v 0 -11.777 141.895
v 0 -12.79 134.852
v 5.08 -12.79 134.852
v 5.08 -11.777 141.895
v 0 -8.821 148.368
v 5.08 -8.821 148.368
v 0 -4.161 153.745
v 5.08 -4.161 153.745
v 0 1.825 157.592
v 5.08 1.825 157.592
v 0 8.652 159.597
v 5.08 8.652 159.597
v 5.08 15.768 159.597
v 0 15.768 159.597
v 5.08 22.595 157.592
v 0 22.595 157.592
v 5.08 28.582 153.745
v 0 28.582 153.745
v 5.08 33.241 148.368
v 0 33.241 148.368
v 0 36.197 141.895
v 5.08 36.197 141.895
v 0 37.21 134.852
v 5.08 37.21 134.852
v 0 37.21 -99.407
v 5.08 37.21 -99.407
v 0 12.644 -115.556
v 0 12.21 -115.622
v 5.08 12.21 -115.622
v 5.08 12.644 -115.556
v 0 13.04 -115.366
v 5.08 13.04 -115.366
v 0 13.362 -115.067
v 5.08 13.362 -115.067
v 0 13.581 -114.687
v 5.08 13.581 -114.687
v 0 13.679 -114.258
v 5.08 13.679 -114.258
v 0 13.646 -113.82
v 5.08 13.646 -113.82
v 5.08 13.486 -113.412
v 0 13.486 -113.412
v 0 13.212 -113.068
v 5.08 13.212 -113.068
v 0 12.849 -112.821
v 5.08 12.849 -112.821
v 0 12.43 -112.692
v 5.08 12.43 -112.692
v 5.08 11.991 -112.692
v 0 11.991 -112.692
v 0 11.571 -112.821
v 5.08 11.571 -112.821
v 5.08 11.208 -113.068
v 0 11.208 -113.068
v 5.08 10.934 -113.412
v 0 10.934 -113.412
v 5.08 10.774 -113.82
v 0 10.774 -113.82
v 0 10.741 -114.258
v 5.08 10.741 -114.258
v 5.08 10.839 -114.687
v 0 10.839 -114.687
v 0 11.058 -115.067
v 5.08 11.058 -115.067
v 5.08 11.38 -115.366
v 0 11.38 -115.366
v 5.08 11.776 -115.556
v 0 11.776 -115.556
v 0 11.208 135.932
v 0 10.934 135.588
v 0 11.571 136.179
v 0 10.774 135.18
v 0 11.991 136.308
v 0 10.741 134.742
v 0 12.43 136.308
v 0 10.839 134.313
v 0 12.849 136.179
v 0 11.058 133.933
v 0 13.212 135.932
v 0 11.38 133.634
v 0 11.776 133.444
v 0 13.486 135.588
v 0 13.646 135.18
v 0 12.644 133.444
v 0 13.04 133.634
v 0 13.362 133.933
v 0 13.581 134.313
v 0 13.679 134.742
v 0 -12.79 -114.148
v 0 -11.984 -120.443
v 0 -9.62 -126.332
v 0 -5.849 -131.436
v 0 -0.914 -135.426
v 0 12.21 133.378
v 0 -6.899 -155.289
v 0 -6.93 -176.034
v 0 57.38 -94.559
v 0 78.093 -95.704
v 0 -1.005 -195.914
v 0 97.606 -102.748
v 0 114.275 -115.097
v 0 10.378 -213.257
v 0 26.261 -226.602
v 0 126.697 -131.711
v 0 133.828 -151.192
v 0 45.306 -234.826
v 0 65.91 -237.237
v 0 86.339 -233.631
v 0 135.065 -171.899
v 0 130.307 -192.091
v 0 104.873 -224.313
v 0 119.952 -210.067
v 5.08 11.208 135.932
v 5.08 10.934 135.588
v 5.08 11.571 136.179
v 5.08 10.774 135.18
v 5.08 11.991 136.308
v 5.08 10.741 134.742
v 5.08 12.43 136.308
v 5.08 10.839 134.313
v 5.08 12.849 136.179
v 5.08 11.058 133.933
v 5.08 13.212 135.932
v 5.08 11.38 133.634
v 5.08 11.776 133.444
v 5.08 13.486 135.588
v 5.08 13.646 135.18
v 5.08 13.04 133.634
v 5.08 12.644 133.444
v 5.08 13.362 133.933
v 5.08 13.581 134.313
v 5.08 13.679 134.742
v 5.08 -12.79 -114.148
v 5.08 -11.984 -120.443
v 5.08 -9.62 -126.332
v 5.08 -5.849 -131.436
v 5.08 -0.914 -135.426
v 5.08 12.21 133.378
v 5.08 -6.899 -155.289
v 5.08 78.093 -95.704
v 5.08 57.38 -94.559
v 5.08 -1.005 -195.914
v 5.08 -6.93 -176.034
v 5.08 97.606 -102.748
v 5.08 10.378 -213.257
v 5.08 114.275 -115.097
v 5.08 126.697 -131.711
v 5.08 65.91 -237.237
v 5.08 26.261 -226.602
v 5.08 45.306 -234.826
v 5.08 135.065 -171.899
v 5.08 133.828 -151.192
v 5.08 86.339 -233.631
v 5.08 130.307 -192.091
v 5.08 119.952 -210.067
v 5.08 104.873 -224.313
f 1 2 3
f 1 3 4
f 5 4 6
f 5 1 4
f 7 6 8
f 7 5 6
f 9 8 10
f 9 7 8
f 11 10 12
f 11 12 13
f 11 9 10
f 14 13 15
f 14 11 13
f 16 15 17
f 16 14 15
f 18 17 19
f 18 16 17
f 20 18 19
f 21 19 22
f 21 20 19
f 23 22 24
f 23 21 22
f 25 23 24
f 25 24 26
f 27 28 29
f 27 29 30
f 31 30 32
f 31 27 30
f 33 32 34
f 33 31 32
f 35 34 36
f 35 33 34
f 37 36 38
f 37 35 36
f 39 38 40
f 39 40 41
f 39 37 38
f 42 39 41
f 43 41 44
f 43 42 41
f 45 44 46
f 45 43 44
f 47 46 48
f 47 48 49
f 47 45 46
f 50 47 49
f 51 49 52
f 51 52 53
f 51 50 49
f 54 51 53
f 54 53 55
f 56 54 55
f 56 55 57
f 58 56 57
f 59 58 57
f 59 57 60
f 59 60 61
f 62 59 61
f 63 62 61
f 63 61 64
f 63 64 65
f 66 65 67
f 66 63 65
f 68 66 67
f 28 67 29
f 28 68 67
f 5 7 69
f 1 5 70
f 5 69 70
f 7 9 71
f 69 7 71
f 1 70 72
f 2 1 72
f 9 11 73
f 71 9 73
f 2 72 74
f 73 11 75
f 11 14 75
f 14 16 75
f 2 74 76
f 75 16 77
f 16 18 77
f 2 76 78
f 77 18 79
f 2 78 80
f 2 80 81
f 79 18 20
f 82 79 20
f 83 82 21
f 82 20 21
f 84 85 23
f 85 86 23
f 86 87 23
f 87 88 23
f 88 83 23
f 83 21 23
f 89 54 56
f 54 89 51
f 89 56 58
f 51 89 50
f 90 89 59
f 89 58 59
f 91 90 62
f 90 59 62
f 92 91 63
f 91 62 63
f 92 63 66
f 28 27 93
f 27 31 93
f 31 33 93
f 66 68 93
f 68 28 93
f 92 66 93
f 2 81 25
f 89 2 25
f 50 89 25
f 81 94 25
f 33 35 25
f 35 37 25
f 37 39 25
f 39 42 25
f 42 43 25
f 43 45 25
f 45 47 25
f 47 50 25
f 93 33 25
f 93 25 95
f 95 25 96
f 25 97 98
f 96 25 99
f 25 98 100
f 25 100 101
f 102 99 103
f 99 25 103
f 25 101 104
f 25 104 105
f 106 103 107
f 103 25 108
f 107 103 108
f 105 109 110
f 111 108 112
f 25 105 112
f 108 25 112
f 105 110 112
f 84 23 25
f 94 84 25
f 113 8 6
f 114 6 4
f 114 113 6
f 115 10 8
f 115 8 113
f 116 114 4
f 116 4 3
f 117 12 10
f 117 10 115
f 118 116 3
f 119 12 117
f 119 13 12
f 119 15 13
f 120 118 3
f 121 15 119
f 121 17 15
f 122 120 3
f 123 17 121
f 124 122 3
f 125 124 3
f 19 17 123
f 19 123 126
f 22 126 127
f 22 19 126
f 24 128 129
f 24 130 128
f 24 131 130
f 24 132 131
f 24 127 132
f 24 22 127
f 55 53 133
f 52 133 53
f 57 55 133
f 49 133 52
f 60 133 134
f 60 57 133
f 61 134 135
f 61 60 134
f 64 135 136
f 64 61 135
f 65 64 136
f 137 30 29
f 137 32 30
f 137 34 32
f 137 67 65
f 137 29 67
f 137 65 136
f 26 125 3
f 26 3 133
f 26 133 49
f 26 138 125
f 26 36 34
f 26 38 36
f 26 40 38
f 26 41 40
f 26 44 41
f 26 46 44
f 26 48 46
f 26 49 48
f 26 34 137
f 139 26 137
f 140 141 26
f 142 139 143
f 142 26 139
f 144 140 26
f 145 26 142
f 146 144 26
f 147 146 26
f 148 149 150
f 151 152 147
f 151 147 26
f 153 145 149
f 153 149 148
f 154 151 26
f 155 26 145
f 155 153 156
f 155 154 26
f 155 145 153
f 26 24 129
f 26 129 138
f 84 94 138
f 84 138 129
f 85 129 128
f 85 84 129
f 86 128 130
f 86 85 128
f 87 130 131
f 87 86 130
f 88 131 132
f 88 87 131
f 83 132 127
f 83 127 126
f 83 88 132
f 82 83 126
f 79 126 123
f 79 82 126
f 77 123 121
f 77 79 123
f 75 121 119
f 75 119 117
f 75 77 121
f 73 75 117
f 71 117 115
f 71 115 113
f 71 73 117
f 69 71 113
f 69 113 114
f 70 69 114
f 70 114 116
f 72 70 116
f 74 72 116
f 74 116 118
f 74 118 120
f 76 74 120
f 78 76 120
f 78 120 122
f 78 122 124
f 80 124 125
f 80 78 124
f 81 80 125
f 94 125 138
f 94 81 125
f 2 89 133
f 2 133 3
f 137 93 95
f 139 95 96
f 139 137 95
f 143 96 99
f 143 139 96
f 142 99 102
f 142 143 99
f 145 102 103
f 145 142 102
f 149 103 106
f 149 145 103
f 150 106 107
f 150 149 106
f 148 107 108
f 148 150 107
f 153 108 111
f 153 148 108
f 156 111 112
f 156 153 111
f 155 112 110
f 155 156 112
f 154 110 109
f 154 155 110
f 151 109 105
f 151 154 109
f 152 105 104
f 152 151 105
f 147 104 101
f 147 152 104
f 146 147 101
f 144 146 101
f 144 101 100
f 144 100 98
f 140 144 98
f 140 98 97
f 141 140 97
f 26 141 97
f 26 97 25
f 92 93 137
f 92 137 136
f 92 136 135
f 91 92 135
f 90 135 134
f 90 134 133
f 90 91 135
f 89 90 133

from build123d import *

# Parameters (mm, degrees)
SKETCH1_R           = 1.4732
BOSS_EXTRUDE1_DEPTH = 5.08
SKETCH2_R           = 71.5
BOSS_EXTRUDE2_DEPTH = 5.08


with BuildPart() as part:
    # Sketch1 → Boss-Extrude1 (new body)
    with BuildSketch(Plane(origin=(0, 0, 0), x_dir=(0, 0, -1), z_dir=(1, 0, 0))):
        with BuildLine():
            Line((-134.851685393, 37.21011236), (114.148314607, 37.21011236))
            ThreePointArc((114.148314607, 37.21011236), (139.148314607, 12.21011236), (114.148314607, -12.78988764))
            Line((114.148314607, -12.78988764), (-134.851685393, -12.78988764))
            ThreePointArc((-134.851685393, -12.78988764), (-159.851685393, 12.21011236), (-134.851685393, 37.21011236))
        make_face()
        with Locations((-134.851685393, 12.21011236)):
            Circle(SKETCH1_R, mode=Mode.SUBTRACT)
        with Locations((114.148314607, 12.21011236)):
            Circle(SKETCH1_R, mode=Mode.SUBTRACT)
    extrude(amount=BOSS_EXTRUDE1_DEPTH)

    # Sketch2 → Boss-Extrude2 (add)
    with BuildSketch(Plane(origin=(5.08, 0, 0), x_dir=(0, 0, -1), z_dir=(1, 0, 0))):
        with Locations((165.767109633, 63.828907386)):
            Circle(SKETCH2_R)
    extrude(amount=-BOSS_EXTRUDE2_DEPTH)


solid = part.part
